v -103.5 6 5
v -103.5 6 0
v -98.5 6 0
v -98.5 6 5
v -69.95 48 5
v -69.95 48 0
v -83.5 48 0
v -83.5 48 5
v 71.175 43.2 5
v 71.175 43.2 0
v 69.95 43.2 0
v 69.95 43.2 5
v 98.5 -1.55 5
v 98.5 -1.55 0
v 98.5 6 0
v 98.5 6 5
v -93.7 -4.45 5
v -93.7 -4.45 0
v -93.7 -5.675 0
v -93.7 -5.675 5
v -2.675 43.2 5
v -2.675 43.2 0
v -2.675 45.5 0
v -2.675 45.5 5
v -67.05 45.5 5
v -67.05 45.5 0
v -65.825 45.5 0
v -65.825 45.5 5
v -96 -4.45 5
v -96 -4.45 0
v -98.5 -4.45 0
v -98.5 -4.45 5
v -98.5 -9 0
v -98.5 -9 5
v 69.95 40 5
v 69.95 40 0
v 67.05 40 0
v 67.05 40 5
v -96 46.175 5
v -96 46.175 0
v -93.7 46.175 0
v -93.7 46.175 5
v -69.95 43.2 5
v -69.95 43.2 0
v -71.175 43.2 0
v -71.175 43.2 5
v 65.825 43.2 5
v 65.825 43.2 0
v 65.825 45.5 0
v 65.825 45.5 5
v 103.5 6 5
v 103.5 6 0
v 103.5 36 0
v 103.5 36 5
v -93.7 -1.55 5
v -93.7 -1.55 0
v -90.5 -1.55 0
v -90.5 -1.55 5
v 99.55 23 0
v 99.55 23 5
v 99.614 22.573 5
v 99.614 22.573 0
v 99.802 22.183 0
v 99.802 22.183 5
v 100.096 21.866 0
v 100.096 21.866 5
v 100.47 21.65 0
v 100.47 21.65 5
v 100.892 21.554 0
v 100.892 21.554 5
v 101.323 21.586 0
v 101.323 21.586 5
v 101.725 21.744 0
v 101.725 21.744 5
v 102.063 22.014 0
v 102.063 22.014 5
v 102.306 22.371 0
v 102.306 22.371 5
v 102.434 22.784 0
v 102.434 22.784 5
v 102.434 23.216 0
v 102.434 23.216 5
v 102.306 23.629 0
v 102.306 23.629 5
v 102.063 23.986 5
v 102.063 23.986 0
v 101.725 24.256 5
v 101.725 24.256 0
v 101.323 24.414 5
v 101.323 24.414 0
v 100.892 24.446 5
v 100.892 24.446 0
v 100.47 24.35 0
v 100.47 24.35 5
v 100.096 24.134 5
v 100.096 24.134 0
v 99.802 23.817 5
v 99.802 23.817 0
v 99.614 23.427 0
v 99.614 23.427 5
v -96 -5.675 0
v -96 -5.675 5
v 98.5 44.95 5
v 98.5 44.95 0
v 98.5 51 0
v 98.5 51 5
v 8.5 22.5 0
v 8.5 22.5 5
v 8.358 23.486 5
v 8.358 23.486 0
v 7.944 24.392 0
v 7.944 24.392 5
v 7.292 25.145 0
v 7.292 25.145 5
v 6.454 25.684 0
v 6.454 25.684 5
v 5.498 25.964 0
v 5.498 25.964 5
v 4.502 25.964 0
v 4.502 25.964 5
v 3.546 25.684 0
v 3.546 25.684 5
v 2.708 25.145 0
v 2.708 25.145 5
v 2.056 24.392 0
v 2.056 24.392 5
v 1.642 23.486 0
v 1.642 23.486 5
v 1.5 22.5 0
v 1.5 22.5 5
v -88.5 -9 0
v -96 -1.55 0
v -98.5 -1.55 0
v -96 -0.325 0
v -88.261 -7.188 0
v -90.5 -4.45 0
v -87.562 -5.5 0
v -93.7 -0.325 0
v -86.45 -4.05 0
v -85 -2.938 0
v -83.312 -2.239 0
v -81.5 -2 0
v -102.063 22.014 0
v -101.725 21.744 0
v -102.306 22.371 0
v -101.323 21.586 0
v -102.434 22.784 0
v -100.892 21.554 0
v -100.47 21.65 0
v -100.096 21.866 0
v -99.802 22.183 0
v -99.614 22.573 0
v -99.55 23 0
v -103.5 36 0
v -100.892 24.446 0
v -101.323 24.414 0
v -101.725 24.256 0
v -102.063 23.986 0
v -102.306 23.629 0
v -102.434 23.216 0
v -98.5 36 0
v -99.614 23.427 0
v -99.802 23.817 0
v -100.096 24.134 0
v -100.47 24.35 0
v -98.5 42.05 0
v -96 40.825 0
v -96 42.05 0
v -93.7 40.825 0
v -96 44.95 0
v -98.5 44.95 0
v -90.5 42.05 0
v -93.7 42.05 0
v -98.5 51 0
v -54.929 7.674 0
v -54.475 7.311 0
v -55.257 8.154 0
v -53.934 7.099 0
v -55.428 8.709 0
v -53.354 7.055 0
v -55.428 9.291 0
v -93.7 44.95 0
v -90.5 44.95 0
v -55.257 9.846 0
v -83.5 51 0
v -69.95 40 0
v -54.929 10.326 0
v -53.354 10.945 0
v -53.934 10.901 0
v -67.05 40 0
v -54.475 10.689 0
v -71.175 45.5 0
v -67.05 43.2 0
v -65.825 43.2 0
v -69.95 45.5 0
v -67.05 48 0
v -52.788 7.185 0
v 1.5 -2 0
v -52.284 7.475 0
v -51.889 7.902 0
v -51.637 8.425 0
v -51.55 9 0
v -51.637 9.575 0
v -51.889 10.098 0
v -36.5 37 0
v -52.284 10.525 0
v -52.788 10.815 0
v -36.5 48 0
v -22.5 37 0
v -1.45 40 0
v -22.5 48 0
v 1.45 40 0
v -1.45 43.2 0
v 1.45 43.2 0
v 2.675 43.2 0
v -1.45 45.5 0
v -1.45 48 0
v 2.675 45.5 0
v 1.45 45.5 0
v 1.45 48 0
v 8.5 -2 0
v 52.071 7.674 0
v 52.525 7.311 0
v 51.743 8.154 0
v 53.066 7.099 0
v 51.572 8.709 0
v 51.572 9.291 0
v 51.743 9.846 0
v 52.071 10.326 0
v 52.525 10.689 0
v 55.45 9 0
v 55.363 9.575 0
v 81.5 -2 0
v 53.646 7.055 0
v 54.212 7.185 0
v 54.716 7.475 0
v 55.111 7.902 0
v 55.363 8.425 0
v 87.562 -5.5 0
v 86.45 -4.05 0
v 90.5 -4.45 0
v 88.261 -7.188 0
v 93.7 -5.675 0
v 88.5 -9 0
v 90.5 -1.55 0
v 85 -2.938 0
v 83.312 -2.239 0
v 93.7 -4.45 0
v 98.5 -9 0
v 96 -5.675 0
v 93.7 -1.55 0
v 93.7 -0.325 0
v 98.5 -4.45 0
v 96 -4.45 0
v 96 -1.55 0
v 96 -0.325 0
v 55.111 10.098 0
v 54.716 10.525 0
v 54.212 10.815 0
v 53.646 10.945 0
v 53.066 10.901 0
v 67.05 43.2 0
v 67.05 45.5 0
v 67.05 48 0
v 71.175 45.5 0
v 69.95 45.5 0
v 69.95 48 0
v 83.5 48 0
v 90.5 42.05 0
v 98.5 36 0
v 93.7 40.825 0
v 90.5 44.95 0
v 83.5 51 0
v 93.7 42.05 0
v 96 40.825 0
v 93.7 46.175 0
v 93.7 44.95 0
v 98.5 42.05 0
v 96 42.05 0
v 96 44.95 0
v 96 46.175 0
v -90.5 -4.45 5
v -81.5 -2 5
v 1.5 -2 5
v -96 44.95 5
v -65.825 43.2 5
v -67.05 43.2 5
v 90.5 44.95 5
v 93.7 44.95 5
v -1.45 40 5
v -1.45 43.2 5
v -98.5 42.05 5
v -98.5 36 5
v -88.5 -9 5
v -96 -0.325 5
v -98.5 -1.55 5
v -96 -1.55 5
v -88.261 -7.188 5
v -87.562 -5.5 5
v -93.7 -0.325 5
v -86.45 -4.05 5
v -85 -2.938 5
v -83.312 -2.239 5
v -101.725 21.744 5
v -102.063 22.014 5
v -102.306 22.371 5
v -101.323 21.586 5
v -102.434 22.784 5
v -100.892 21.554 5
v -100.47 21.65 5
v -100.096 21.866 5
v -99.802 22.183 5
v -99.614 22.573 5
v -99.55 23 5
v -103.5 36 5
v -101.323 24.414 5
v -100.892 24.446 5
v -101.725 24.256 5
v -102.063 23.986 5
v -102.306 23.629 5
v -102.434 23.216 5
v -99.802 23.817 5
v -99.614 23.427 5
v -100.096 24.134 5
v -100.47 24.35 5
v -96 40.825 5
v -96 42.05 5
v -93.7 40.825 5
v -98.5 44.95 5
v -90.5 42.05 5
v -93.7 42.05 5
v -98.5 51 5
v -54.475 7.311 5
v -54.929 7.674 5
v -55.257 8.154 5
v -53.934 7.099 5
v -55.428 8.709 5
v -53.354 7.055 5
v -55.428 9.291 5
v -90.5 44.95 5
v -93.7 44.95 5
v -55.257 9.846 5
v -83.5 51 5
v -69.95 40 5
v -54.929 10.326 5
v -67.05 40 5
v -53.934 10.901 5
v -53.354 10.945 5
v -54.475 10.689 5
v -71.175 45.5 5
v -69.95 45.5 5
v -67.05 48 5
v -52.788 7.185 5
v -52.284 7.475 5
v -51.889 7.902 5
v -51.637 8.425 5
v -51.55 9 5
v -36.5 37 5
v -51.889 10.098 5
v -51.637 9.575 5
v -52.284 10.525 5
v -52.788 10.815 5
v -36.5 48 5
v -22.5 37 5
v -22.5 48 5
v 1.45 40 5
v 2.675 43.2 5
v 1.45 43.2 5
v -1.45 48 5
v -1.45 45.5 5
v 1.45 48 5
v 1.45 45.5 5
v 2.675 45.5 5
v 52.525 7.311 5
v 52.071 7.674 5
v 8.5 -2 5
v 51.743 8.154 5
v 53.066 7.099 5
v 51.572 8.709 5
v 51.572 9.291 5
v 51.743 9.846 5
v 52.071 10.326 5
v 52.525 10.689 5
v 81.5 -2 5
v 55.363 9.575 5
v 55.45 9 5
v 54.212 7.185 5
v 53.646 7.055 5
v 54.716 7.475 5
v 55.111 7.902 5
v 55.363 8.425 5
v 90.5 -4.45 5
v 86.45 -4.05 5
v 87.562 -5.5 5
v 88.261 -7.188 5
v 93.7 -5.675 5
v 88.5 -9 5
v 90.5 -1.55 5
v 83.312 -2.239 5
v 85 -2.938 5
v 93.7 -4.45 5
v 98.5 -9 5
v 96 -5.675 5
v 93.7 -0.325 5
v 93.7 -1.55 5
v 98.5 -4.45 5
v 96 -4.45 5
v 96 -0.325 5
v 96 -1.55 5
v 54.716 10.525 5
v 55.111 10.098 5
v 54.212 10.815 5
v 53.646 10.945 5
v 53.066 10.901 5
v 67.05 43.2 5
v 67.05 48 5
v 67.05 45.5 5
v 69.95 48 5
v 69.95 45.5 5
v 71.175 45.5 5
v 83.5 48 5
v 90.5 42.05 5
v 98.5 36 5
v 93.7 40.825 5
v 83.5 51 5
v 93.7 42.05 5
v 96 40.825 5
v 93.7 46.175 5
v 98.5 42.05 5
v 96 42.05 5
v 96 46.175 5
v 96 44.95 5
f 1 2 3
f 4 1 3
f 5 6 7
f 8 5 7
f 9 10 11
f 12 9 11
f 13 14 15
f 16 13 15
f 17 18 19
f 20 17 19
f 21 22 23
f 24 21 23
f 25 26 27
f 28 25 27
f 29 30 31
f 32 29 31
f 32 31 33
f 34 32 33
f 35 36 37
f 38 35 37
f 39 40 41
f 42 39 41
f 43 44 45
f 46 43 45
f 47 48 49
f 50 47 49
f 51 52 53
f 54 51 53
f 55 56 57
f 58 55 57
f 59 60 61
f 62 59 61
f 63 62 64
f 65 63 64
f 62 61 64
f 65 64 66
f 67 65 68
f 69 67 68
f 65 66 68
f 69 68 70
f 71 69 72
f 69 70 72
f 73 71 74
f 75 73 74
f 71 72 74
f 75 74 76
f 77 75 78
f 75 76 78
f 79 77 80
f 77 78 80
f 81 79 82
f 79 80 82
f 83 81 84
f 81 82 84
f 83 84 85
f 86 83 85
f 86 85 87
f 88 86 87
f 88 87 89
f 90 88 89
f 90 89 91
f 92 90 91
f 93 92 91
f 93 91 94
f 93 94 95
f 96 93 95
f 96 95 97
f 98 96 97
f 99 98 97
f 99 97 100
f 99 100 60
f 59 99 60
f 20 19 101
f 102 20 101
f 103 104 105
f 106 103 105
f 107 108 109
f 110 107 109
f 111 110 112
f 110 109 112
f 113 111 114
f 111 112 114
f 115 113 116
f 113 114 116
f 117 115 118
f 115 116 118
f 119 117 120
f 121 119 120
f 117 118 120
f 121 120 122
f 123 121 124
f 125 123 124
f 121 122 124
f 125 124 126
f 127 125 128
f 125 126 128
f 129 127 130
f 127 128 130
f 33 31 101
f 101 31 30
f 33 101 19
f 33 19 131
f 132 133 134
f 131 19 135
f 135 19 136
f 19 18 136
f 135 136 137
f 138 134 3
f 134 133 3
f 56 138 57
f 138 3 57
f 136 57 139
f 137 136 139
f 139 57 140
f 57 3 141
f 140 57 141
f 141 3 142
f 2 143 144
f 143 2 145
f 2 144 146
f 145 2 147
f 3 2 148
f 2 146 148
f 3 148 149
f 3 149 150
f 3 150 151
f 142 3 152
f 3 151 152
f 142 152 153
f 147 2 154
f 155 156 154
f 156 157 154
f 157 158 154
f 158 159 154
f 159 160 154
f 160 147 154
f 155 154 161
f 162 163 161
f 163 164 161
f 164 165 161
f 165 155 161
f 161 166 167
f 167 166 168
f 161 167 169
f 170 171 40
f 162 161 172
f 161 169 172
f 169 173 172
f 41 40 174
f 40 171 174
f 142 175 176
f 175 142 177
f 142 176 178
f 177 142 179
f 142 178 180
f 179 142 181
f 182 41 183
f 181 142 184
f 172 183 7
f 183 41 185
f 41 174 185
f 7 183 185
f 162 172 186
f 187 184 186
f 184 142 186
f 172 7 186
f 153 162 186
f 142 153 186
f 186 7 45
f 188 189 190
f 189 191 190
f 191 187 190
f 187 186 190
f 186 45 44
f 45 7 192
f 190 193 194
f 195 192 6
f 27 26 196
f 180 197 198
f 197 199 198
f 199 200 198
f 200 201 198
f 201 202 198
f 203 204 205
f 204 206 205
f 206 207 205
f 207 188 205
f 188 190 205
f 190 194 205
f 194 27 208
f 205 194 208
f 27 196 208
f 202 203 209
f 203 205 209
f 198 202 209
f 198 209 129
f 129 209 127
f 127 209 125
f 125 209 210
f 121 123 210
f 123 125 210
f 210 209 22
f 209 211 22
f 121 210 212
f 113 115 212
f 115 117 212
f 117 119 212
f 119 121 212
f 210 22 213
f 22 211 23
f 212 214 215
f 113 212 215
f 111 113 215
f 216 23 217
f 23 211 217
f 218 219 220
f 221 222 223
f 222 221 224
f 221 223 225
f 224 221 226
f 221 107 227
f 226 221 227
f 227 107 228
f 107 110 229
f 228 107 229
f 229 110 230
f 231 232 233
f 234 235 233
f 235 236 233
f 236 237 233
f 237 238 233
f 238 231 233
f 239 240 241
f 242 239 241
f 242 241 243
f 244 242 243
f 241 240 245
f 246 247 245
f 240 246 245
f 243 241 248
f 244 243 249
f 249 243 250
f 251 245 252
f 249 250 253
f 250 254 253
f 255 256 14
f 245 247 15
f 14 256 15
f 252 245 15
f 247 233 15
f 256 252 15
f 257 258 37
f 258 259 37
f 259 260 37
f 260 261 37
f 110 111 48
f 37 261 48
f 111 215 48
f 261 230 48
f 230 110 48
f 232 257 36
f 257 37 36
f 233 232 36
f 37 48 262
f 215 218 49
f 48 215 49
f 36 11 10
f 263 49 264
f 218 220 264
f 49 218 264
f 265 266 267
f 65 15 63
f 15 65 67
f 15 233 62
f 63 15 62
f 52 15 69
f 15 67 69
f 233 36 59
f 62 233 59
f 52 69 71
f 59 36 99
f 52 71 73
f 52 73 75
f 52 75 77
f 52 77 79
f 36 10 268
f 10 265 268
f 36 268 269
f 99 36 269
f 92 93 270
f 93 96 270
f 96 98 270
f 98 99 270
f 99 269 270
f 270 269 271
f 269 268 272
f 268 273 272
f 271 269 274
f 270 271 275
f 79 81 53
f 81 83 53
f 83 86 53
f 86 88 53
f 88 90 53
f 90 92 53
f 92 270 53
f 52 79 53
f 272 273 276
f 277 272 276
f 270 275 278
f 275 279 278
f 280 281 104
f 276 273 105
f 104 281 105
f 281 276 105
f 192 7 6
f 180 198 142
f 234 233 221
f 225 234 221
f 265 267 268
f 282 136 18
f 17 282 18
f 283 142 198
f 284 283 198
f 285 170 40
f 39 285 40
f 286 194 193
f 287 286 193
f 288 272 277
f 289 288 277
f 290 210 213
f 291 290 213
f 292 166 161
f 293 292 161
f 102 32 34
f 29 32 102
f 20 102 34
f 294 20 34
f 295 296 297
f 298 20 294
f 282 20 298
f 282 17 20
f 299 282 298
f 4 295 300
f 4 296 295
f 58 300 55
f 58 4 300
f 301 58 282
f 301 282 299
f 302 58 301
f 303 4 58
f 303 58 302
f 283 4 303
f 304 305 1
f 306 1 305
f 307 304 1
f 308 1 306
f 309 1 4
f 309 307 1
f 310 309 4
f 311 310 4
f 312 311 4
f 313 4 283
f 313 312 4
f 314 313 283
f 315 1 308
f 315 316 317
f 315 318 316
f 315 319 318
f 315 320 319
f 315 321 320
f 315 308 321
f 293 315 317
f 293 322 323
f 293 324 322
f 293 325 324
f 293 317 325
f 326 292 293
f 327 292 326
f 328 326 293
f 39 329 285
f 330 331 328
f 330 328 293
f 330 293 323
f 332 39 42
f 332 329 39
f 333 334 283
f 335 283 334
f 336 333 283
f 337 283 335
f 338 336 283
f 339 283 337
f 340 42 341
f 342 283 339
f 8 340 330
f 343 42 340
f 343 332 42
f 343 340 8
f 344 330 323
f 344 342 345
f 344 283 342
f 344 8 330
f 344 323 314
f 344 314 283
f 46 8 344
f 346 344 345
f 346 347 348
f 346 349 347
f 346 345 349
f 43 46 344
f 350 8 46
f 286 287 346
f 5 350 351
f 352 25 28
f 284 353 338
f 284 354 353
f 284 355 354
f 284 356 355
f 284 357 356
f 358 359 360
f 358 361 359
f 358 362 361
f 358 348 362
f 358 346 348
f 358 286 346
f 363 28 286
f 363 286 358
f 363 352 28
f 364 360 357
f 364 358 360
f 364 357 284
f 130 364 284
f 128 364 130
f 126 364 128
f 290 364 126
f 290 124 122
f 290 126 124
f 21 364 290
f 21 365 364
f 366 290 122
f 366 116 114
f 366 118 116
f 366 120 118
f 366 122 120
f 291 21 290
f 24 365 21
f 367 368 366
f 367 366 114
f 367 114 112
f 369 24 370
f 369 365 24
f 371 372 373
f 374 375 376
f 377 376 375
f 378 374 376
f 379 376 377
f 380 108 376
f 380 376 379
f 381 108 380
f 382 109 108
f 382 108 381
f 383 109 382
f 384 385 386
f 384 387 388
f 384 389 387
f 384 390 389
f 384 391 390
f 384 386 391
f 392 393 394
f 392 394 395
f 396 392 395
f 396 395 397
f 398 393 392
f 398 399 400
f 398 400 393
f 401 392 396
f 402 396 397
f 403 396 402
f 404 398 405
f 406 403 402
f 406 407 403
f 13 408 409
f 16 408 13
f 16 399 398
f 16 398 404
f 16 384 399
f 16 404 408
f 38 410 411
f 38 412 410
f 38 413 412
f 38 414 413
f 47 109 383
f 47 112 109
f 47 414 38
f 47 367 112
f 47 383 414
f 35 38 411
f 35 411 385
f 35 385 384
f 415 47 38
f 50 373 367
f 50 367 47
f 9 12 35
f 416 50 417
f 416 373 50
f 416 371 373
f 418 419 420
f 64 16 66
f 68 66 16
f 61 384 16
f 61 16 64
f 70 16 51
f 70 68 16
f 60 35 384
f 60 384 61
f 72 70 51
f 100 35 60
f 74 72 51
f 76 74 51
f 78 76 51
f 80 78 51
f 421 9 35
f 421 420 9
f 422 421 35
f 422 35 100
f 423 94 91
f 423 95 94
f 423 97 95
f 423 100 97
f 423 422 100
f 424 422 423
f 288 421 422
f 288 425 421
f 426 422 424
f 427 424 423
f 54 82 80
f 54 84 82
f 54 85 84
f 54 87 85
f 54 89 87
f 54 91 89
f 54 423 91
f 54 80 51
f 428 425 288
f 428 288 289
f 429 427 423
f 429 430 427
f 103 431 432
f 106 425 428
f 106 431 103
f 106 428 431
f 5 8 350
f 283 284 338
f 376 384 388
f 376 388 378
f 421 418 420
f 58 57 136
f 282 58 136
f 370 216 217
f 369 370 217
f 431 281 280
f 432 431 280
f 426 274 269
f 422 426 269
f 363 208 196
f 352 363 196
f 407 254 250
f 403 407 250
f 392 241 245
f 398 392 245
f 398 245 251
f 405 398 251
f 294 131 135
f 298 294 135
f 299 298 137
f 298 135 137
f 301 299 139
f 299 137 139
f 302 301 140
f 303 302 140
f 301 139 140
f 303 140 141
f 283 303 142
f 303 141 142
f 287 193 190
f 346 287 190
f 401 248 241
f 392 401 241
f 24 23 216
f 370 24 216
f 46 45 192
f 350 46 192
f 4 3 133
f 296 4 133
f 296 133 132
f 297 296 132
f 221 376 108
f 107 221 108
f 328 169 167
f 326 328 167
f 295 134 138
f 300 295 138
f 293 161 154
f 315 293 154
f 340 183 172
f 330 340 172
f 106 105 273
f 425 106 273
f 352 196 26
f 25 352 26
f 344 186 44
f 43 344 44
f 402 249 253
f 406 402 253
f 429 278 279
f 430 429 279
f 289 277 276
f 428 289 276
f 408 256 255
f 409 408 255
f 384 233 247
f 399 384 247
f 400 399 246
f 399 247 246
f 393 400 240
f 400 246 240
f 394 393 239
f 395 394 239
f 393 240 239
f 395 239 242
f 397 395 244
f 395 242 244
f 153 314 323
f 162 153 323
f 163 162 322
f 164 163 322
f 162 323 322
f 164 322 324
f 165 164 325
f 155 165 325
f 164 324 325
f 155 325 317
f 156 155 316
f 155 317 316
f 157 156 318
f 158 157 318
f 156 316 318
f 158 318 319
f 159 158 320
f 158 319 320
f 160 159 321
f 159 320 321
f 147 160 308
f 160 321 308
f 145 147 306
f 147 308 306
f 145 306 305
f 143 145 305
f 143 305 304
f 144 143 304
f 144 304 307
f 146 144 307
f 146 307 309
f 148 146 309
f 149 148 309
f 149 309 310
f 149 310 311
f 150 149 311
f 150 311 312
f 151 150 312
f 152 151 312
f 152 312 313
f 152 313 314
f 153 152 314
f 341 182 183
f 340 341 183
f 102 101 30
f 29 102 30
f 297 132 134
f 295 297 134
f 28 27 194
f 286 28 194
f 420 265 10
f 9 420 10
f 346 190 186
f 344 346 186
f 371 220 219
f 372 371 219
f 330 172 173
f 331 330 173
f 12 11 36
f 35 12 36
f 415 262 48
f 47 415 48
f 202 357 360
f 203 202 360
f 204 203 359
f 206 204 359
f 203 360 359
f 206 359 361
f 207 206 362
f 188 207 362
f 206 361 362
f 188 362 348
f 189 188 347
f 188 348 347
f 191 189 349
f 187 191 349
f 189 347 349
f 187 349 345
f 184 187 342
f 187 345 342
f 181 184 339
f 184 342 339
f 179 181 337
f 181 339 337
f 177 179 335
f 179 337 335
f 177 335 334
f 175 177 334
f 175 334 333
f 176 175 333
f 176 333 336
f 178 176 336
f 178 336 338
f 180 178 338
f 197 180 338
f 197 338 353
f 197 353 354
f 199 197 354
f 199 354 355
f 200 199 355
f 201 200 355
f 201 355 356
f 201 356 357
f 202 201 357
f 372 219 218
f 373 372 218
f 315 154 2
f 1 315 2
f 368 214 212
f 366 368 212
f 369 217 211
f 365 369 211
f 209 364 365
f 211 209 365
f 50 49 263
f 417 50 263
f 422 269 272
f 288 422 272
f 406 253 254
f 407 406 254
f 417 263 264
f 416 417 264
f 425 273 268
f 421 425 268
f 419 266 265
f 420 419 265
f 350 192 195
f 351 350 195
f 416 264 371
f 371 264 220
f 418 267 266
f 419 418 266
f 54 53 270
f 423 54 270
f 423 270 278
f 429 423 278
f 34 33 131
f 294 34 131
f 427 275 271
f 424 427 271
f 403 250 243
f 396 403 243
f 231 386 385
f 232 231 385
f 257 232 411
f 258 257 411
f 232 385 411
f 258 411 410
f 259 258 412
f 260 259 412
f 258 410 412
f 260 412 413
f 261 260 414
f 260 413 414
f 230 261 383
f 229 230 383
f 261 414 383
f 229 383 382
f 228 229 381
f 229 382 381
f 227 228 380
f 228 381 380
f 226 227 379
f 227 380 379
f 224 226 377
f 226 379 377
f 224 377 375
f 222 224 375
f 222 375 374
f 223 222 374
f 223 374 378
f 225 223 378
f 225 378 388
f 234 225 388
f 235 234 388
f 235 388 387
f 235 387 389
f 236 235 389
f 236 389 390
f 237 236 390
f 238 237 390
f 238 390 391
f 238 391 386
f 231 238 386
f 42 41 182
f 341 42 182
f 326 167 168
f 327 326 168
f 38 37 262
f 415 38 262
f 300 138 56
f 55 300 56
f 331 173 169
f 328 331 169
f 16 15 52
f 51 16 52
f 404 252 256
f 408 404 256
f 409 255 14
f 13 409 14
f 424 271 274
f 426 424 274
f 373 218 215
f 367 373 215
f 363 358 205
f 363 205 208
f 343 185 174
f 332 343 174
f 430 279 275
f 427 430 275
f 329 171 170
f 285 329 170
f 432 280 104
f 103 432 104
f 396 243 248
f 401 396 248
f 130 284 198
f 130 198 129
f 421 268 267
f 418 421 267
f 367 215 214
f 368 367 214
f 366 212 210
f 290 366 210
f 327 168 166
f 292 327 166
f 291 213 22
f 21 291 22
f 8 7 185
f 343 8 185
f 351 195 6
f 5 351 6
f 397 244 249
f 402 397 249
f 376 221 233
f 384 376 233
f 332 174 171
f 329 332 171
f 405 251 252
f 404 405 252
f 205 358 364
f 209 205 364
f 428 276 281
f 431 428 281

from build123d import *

# Parameters (mm, degrees)
BOSS_EXTRUDE1_DEPTH = 5
SKETCH2_W           = 14
SKETCH2_H           = 12
CUT_EXTRUDE1_DEPTH  = 116.491341667
SKETCH3_R           = 3.5
SKETCH3_W           = 7
SKETCH3_H           = 24.5
CUT_EXTRUDE2_DEPTH  = 116.491341667
SKETCH4_R           = 1.45
SKETCH4_W           = 8
SKETCH4_H           = 2.9
SKETCH4_W_2         = 2.3
SKETCH4_H_2         = 5.35
SKETCH4_W_3         = 2.9
SKETCH4_H_3         = 8
SKETCH4_W_4         = 5.35
SKETCH4_H_4         = 2.3
CUT_EXTRUDE3_DEPTH  = 116.491341667
SKETCH5_R           = 1.95
CUT_EXTRUDE4_DEPTH  = 116.491341667


with BuildPart() as part:
    # Sketch1 → Boss-Extrude1 (new body)
    with BuildSketch(Plane.XY):
        with BuildLine():
            Line((-83.5, 48), (-83.5, 51))
            Line((-83.5, 51), (-98.5, 51))
            Line((-98.5, 51), (-98.5, 44.95))
            Line((-98.5, 44.95), (-96, 44.95))
            Line((-96, 44.95), (-96, 46.175))
            Line((-96, 46.175), (-93.7, 46.175))
            Line((-93.7, 46.175), (-93.7, 44.95))
            Line((-93.7, 44.95), (-90.5, 44.95))
            Line((-90.5, 44.95), (-90.5, 42.05))
            Line((-90.5, 42.05), (-93.7, 42.05))
            Line((-93.7, 42.05), (-93.7, 40.825))
            Line((-93.7, 40.825), (-96, 40.825))
            Line((-96, 40.825), (-96, 42.05))
            Line((-96, 42.05), (-98.5, 42.05))
            Line((-98.5, 42.05), (-98.5, 36))
            Line((-98.5, 36), (-103.5, 36))
            Line((-103.5, 36), (-103.5, 6))
            Line((-103.5, 6), (-98.5, 6))
            Line((-98.5, 6), (-98.5, -1.55))
            Line((-98.5, -1.55), (-96, -1.55))
            Line((-96, -1.55), (-96, -0.325))
            Line((-96, -0.325), (-93.7, -0.325))
            Line((-93.7, -0.325), (-93.7, -1.55))
            Line((-93.7, -1.55), (-90.5, -1.55))
            Line((-90.5, -1.55), (-90.5, -4.45))
            Line((-90.5, -4.45), (-93.7, -4.45))
            Line((-93.7, -4.45), (-93.7, -5.675))
            Line((-93.7, -5.675), (-96, -5.675))
            Line((-96, -5.675), (-96, -4.45))
            Line((-96, -4.45), (-98.5, -4.45))
            Line((-98.5, -4.45), (-98.5, -9))
            Line((-98.5, -9), (-88.5, -9))
            ThreePointArc((-88.5, -9), (-86.449747468, -4.050252532), (-81.5, -2))
            Line((-81.5, -2), (81.5, -2))
            ThreePointArc((81.5, -2), (86.449747468, -4.050252532), (88.5, -9))
            Line((88.5, -9), (98.5, -9))
            Line((98.5, -9), (98.5, -4.45))
            Line((98.5, -4.45), (96, -4.45))
            Line((96, -4.45), (96, -5.675))
            Line((96, -5.675), (93.7, -5.675))
            Line((93.7, -5.675), (93.7, -4.45))
            Line((93.7, -4.45), (90.5, -4.45))
            Line((90.5, -4.45), (90.5, -1.55))
            Line((90.5, -1.55), (93.7, -1.55))
            Line((93.7, -1.55), (93.7, -0.325))
            Line((93.7, -0.325), (96, -0.325))
            Line((96, -0.325), (96, -1.55))
            Line((96, -1.55), (98.5, -1.55))
            Line((98.5, -1.55), (98.5, 6))
            Line((98.5, 6), (103.5, 6))
            Line((103.5, 6), (103.5, 36))
            Line((103.5, 36), (98.5, 36))
            Line((98.5, 36), (98.5, 42.05))
            Line((98.5, 42.05), (96, 42.05))
            Line((96, 42.05), (96, 40.825))
            Line((96, 40.825), (93.7, 40.825))
            Line((93.7, 40.825), (93.7, 42.05))
            Line((93.7, 42.05), (90.5, 42.05))
            Line((90.5, 42.05), (90.5, 44.95))
            Line((90.5, 44.95), (93.7, 44.95))
            Line((93.7, 44.95), (93.7, 46.175))
            Line((93.7, 46.175), (96, 46.175))
            Line((96, 46.175), (96, 44.95))
            Line((96, 44.95), (98.5, 44.95))
            Line((98.5, 44.95), (98.5, 51))
            Line((98.5, 51), (83.5, 51))
            Line((83.5, 51), (83.5, 48))
            Line((83.5, 48), (69.95, 48))
            Line((69.95, 48), (69.95, 45.5))
            Line((69.95, 45.5), (71.175, 45.5))
            Line((71.175, 45.5), (71.175, 43.2))
            Line((71.175, 43.2), (69.95, 43.2))
            Line((69.95, 43.2), (69.95, 40))
            Line((69.95, 40), (67.05, 40))
            Line((67.05, 40), (67.05, 43.2))
            Line((67.05, 43.2), (65.825, 43.2))
            Line((65.825, 43.2), (65.825, 45.5))
            Line((65.825, 45.5), (67.05, 45.5))
            Line((67.05, 45.5), (67.05, 48))
            Line((67.05, 48), (1.45, 48))
            Line((1.45, 48), (1.45, 45.5))
            Line((1.45, 45.5), (2.675, 45.5))
            Line((2.675, 45.5), (2.675, 43.2))
            Line((2.675, 43.2), (1.45, 43.2))
            Line((1.45, 43.2), (1.45, 40))
            Line((1.45, 40), (-1.45, 40))
            Line((-1.45, 40), (-1.45, 43.2))
            Line((-1.45, 43.2), (-2.675, 43.2))
            Line((-2.675, 43.2), (-2.675, 45.5))
            Line((-2.675, 45.5), (-1.45, 45.5))
            Line((-1.45, 45.5), (-1.45, 48))
            Line((-1.45, 48), (-67.05, 48))
            Line((-67.05, 48), (-67.05, 45.5))
            Line((-67.05, 45.5), (-65.825, 45.5))
            Line((-65.825, 45.5), (-65.825, 43.2))
            Line((-65.825, 43.2), (-67.05, 43.2))
            Line((-67.05, 43.2), (-67.05, 40))
            Line((-67.05, 40), (-69.95, 40))
            Line((-69.95, 40), (-69.95, 43.2))
            Line((-69.95, 43.2), (-71.175, 43.2))
            Line((-71.175, 43.2), (-71.175, 45.5))
            Line((-71.175, 45.5), (-69.95, 45.5))
            Line((-69.95, 45.5), (-69.95, 48))
            Line((-69.95, 48), (-83.5, 48))
        make_face()
    extrude(amount=BOSS_EXTRUDE1_DEPTH)

    # Sketch2 → Cut-Extrude1 (cut, through all)
    with BuildSketch(Plane.XY.offset(5)):
        with Locations((-29.5, 43)):
            Rectangle(SKETCH2_W, SKETCH2_H)
    extrude(amount=-CUT_EXTRUDE1_DEPTH, mode=Mode.SUBTRACT)

    # Sketch3 → Cut-Extrude2 (cut, through all)
    with BuildSketch(Plane.XY.offset(5)):
        with Locations((5, 22.5)):
            Circle(SKETCH3_R)
        with Locations((5, 10.25)):
            Rectangle(SKETCH3_W, SKETCH3_H)
    extrude(amount=-CUT_EXTRUDE2_DEPTH, mode=Mode.SUBTRACT)

    # Sketch4 → Cut-Extrude3 (cut, through all)
    with BuildSketch(Plane.XY.offset(5)):
        with Locations((-101, 23)):
            Circle(SKETCH4_R)
        with Locations(Location((101, 23, 0), (0, 0, 180))):
            Circle(SKETCH4_R)
        with Locations((-94.5, 43.5)):
            Rectangle(SKETCH4_W, SKETCH4_H)
        with Locations((-94.85, 43.5)):
            Rectangle(SKETCH4_W_2, SKETCH4_H_2)
        with Locations((-94.5, -3)):
            Rectangle(SKETCH4_W, SKETCH4_H)
        with Locations((-94.85, -3)):
            Rectangle(SKETCH4_W_2, SKETCH4_H_2)
        with Locations((94.85, -3)):
            Rectangle(SKETCH4_W_2, SKETCH4_H_2)
        with Locations((94.5, -3)):
            Rectangle(SKETCH4_W, SKETCH4_H)
        with Locations((94.85, 43.5)):
            Rectangle(SKETCH4_W_2, SKETCH4_H_2)
        with Locations((94.5, 43.5)):
            Rectangle(SKETCH4_W, SKETCH4_H)
        with Locations((-68.5, 44)):
            Rectangle(SKETCH4_W_3, SKETCH4_H_3)
        with Locations((-68.5, 44.35)):
            Rectangle(SKETCH4_W_4, SKETCH4_H_4)
        with Locations((0, 44)):
            Rectangle(SKETCH4_W_3, SKETCH4_H_3)
        with Locations((0, 44.35)):
            Rectangle(SKETCH4_W_4, SKETCH4_H_4)
        with Locations((68.5, 44.35)):
            Rectangle(SKETCH4_W_4, SKETCH4_H_4)
        with Locations((68.5, 44)):
            Rectangle(SKETCH4_W_3, SKETCH4_H_3)
    extrude(amount=-CUT_EXTRUDE3_DEPTH, mode=Mode.SUBTRACT)

    # Sketch5 → Cut-Extrude4 (cut, through all)
    with BuildSketch(Plane.XY.offset(5)):
        with Locations((-53.5, 9)):
            Circle(SKETCH5_R)
        with Locations((53.5, 9)):
            Circle(SKETCH5_R)
    extrude(amount=-CUT_EXTRUDE4_DEPTH, mode=Mode.SUBTRACT)


solid = part.part
